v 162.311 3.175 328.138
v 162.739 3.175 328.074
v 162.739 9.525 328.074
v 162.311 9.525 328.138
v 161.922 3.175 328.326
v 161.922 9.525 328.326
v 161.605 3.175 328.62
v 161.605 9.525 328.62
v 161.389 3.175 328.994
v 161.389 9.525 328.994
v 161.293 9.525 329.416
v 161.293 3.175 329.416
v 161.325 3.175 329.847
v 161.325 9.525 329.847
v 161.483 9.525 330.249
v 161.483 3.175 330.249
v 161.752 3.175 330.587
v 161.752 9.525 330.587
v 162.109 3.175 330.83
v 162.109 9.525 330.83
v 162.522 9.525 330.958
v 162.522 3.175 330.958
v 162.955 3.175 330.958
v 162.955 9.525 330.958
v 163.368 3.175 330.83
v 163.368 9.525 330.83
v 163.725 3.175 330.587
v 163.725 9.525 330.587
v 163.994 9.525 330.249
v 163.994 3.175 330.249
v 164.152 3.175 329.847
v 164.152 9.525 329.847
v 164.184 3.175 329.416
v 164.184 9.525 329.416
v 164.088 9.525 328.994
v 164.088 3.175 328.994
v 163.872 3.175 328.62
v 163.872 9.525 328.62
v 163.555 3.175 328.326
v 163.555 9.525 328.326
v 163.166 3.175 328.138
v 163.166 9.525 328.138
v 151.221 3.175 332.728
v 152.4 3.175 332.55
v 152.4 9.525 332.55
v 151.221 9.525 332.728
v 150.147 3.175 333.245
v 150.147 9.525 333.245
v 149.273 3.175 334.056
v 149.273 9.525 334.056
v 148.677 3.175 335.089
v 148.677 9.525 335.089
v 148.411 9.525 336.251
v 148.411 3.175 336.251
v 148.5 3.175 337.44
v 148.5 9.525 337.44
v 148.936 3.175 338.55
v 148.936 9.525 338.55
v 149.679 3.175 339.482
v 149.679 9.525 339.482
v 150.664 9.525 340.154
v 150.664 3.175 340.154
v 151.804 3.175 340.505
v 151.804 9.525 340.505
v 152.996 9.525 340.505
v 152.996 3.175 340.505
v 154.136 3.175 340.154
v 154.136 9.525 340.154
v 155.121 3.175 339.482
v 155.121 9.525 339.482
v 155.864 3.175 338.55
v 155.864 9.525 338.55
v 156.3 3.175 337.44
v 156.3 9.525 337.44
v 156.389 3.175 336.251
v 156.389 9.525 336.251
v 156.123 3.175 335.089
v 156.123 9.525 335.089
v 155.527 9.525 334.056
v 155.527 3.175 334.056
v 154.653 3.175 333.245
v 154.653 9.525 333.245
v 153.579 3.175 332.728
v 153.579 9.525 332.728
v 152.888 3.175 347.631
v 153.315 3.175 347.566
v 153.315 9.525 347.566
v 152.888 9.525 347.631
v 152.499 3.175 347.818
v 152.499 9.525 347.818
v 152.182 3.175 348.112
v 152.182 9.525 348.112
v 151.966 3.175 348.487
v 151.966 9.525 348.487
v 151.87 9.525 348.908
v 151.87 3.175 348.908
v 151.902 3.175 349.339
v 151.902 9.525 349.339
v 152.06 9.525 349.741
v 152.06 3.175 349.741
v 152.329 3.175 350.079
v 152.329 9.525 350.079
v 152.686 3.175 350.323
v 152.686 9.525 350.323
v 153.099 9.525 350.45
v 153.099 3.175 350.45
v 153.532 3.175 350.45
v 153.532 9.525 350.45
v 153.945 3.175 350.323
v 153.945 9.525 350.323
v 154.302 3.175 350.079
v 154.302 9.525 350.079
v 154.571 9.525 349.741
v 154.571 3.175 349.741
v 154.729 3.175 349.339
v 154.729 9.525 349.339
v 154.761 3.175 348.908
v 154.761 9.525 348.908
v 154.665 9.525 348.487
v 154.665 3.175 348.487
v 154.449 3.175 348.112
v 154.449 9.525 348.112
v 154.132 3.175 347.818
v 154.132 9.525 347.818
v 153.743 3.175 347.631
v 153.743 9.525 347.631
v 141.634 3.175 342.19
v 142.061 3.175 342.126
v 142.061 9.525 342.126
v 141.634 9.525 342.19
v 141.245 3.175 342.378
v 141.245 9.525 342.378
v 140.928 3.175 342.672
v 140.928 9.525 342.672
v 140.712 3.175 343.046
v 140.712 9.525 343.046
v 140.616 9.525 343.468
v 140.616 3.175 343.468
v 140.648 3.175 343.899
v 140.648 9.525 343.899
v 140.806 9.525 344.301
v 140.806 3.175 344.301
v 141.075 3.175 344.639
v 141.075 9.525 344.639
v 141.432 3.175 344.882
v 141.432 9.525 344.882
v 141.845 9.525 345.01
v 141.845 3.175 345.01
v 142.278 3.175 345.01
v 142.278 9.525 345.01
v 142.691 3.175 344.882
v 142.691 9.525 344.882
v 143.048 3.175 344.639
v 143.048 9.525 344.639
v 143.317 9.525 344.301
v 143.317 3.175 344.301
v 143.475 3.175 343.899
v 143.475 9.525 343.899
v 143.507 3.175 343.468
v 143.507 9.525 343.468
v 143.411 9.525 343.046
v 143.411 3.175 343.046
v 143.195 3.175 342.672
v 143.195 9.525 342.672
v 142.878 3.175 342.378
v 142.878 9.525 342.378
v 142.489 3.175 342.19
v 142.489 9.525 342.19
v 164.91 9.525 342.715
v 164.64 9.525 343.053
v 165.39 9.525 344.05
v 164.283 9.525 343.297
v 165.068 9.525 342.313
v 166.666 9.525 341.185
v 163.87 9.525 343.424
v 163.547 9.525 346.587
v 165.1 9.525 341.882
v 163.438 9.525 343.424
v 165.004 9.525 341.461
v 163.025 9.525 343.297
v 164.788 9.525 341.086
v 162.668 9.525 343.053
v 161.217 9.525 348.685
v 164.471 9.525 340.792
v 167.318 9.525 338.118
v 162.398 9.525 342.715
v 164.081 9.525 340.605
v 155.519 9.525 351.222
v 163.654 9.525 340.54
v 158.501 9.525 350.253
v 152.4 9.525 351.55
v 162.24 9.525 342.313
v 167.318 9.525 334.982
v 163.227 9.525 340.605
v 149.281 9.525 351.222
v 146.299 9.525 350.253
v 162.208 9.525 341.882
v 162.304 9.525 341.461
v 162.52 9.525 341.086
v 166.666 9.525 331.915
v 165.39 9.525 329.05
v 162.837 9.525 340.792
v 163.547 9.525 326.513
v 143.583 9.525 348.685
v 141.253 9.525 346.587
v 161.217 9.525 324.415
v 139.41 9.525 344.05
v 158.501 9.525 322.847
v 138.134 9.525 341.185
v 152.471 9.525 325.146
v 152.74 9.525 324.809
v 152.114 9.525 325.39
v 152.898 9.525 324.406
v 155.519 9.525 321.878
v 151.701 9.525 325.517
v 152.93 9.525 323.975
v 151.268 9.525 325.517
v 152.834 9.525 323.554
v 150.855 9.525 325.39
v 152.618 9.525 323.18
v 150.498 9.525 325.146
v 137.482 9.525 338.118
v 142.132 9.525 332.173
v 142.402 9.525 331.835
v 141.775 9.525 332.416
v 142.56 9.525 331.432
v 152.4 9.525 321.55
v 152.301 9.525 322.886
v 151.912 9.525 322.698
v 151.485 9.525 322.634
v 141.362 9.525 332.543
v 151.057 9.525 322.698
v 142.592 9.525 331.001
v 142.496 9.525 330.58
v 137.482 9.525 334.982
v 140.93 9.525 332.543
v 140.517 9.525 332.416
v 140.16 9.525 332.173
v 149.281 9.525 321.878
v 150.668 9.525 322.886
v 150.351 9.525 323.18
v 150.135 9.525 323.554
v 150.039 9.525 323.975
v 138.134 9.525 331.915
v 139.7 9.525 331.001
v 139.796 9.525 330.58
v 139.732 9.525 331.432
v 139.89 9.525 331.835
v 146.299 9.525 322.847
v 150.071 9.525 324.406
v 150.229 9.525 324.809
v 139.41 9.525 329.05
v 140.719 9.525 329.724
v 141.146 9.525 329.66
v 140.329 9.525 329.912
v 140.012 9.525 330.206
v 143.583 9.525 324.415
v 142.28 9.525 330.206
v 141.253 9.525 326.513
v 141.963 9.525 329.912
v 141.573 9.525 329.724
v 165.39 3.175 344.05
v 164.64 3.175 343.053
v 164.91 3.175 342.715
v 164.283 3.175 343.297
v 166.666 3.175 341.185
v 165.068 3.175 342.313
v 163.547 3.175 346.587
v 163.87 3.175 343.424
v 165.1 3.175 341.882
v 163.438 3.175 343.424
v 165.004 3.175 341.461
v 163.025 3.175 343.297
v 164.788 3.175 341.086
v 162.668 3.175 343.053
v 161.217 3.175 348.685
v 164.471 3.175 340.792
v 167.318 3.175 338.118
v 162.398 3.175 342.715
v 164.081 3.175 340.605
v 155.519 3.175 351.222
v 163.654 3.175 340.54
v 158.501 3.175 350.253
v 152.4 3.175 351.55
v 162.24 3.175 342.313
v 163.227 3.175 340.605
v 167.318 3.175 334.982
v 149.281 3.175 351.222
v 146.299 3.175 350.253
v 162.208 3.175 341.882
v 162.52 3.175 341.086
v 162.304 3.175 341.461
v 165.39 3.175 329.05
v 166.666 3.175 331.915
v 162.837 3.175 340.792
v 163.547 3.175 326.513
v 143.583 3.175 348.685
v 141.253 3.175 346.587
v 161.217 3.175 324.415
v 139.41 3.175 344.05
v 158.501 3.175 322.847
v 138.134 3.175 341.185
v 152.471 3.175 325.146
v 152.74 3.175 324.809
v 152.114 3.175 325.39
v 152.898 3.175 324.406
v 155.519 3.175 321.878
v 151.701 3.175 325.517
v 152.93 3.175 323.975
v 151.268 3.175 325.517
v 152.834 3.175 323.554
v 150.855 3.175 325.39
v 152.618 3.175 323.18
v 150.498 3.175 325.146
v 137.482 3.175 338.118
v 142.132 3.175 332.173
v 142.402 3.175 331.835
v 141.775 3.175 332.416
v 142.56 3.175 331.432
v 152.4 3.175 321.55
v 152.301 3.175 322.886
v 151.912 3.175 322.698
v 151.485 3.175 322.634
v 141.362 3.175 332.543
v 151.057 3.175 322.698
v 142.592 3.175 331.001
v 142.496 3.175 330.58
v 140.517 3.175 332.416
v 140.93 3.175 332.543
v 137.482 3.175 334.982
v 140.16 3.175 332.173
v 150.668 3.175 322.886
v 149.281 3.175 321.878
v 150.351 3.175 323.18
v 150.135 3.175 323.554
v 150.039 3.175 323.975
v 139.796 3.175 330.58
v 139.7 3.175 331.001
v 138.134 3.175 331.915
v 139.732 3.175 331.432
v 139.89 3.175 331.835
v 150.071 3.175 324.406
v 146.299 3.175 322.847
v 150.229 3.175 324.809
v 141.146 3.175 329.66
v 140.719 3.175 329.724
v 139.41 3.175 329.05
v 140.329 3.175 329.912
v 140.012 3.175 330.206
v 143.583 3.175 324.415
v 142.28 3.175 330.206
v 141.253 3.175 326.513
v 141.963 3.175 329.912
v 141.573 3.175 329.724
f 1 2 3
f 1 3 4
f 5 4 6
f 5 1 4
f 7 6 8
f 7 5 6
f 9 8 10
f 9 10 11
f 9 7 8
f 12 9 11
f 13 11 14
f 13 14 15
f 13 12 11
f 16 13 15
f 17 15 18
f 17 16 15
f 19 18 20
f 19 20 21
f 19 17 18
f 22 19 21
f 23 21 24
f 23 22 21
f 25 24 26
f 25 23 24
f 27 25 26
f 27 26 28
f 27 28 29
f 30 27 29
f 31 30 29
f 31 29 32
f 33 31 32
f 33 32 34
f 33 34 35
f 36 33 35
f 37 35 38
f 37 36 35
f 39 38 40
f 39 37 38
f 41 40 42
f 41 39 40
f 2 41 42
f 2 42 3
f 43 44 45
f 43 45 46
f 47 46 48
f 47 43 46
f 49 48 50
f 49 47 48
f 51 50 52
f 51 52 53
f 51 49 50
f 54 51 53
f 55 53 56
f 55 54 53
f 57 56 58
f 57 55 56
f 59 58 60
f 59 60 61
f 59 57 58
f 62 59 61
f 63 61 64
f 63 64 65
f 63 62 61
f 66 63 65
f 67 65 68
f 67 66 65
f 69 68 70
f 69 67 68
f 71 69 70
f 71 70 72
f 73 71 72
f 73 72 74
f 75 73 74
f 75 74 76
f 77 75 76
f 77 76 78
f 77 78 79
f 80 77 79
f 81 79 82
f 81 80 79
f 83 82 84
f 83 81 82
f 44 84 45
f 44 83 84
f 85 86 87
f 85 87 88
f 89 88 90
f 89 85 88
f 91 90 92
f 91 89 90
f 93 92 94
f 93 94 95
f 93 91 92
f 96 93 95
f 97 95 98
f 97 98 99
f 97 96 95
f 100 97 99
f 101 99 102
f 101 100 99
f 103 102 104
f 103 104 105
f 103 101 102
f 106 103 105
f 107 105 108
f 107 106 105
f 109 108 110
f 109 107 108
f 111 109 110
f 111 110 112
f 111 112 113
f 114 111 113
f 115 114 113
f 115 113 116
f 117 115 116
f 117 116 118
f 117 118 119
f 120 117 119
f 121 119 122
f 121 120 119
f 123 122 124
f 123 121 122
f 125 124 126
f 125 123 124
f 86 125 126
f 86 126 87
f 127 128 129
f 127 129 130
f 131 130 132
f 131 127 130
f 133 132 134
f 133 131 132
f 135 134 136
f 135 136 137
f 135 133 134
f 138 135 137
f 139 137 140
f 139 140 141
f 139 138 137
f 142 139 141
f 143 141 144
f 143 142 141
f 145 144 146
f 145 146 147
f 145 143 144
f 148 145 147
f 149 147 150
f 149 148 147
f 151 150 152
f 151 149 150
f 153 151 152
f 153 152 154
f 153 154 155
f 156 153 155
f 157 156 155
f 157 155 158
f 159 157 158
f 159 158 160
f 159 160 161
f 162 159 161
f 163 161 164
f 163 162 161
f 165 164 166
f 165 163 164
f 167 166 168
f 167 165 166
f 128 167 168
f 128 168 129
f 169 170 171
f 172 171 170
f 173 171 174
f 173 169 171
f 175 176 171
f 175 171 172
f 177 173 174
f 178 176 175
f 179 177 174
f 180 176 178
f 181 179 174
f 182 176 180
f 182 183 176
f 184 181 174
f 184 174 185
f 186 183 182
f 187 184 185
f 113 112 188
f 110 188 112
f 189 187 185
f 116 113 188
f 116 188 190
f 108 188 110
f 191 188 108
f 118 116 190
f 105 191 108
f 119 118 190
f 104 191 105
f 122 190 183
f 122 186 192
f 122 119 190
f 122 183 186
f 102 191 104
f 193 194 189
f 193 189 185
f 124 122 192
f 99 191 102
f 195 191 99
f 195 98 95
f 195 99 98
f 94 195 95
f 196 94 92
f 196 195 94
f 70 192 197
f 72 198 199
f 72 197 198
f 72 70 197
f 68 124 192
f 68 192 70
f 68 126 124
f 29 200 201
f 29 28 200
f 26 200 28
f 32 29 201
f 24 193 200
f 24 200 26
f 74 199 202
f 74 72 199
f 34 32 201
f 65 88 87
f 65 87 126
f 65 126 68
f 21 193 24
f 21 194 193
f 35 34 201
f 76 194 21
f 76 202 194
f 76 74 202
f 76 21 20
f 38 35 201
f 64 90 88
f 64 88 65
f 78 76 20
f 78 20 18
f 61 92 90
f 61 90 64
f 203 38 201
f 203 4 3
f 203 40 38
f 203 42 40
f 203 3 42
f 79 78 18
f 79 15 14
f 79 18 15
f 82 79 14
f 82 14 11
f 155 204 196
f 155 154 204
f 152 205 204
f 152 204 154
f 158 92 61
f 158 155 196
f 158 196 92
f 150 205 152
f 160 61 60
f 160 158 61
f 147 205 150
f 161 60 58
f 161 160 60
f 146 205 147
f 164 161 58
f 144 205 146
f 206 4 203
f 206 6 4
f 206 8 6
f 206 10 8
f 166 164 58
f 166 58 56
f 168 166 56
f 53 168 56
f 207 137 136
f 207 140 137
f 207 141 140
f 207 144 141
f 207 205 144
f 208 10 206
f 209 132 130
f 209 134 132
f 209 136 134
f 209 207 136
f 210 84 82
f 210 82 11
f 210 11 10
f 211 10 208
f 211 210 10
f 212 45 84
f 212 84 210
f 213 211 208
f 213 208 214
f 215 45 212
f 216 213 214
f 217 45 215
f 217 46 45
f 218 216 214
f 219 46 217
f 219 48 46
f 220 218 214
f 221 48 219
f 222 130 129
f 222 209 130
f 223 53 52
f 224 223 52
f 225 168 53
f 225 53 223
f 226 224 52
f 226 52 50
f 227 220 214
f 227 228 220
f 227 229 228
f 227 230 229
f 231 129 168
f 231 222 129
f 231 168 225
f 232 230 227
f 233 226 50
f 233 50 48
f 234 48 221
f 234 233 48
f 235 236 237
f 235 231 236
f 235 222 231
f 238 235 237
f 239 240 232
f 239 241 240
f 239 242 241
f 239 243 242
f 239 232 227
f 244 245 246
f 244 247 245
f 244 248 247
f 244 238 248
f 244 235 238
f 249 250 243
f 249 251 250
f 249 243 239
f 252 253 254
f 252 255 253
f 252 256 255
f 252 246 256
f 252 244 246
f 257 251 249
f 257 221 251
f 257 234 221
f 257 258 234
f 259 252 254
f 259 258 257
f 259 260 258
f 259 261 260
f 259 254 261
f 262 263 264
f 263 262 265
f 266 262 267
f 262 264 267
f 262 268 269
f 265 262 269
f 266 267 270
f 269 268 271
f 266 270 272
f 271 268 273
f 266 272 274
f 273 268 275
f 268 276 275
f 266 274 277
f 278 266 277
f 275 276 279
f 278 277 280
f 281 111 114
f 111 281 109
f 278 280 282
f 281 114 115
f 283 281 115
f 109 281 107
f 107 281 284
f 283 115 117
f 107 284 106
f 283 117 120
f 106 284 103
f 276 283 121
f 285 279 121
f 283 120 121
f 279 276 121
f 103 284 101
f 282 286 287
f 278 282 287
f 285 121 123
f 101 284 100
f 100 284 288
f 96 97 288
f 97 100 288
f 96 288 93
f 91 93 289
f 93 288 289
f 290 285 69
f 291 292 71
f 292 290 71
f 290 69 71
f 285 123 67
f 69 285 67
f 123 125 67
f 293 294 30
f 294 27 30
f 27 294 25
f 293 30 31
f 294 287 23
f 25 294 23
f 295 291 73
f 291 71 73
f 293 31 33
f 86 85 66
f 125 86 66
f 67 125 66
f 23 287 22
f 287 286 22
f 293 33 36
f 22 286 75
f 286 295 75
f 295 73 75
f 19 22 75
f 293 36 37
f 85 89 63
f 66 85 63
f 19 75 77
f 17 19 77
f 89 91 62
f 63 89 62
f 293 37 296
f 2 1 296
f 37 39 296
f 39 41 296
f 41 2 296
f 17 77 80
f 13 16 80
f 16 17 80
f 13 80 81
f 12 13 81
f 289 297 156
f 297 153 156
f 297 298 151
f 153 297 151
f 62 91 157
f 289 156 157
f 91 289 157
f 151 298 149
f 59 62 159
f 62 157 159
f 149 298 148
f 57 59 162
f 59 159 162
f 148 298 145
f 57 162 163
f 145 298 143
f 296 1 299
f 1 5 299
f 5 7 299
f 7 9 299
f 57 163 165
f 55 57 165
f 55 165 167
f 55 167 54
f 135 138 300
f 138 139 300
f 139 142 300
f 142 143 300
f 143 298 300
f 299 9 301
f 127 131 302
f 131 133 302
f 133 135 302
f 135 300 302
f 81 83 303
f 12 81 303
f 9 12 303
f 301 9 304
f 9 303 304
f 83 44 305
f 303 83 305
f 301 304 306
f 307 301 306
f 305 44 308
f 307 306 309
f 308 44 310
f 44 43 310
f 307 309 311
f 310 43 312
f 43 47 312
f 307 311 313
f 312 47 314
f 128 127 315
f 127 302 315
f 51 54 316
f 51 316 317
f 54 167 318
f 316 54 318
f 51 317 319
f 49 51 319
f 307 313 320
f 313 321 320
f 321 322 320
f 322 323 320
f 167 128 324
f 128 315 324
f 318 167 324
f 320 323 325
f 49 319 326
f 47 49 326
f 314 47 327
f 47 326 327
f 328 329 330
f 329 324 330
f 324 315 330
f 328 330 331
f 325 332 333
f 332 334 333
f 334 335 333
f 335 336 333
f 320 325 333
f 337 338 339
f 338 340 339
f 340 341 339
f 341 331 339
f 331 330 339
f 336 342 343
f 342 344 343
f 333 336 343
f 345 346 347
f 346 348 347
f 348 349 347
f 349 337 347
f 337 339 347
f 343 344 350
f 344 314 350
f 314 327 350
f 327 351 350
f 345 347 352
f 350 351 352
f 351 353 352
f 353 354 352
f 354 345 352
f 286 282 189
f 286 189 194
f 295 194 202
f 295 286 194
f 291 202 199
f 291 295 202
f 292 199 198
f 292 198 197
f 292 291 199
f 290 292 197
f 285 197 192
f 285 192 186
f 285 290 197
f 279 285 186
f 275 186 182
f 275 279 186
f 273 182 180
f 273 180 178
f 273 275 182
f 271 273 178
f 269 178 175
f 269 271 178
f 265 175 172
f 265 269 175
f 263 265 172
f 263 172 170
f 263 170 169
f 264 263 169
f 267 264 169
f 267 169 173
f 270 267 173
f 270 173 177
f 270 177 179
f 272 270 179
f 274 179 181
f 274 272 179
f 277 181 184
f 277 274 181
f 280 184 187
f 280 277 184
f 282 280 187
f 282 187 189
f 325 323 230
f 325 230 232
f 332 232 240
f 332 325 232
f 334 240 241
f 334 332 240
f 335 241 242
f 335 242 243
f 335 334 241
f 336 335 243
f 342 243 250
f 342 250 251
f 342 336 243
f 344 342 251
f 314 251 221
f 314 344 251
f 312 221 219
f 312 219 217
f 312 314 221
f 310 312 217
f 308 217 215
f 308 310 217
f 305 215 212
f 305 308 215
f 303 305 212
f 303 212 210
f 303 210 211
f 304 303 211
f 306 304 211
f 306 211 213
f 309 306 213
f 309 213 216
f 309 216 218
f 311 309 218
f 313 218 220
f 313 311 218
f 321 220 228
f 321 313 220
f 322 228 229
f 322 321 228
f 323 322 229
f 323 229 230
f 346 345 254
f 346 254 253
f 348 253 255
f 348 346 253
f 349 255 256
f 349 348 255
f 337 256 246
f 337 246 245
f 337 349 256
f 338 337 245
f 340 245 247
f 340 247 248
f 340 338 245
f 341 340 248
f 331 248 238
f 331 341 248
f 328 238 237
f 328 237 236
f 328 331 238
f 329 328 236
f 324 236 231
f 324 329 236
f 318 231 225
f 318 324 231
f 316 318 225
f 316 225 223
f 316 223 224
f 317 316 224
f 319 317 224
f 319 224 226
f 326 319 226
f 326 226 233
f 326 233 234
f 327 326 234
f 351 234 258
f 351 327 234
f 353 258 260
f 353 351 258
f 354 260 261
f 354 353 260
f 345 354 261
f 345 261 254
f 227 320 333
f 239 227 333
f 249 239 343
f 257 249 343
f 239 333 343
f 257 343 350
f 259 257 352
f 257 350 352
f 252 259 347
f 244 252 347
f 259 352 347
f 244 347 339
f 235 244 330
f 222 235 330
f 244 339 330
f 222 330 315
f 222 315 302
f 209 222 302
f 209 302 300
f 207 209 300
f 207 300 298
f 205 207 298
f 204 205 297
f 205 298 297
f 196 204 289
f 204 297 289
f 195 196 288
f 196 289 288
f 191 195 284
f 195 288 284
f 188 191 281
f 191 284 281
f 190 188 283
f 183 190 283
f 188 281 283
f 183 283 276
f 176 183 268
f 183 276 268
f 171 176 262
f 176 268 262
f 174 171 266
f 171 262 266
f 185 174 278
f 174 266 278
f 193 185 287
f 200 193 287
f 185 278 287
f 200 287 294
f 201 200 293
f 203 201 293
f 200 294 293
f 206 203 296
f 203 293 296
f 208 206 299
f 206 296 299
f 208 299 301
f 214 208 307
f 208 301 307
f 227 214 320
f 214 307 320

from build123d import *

# Parameters (mm, degrees)
DISCO_START    = 3.175
CROQUIS1_R     = 15
DISCO_DEPTH    = 6.35
BARRENOS_START = 3.175
CROQUIS2_R     = 1.45
CROQUIS2_R_2   = 4
BARRENOS_DEPTH = 6.35


with BuildPart() as part:
    # Croquis1 → Disco (new body)
    with BuildSketch(Plane(origin=(0, 0, 0), x_dir=(1, 0, 0), z_dir=(0, 1, 0)).offset(DISCO_START)):
        with Locations(Location((152.4, -336.55, 0), (0, 0, 90))):
            Circle(CROQUIS1_R)
    extrude(amount=DISCO_DEPTH)

    # Croquis2 → Barrenos (cut)
    with BuildSketch(Plane(origin=(0, 0, 0), x_dir=(1, 0, 0), z_dir=(0, 1, 0)).offset(BARRENOS_START)):
        with Locations(Location((163.653984643, -341.990388742, 0), (0, 0, 90))):
            Circle(CROQUIS2_R)
        with Locations(Location((153.315477464, -349.016430965, 0), (0, 0, 90))):
            Circle(CROQUIS2_R)
        with Locations(Location((142.061492822, -343.576042223, 0), (0, 0, 90))):
            Circle(CROQUIS2_R)
        with Locations(Location((141.146015357, -331.109611258, 0), (0, 0, 90))):
            Circle(CROQUIS2_R)
        with Locations(Location((151.484522536, -324.083569035, 0), (0, 0, 90))):
            Circle(CROQUIS2_R)
        with Locations(Location((162.738507178, -329.523957777, 0), (0, 0, 90))):
            Circle(CROQUIS2_R)
        with Locations(Location((152.4, -336.55, 0), (0, 0, 90))):
            Circle(CROQUIS2_R_2)
    extrude(amount=BARRENOS_DEPTH, mode=Mode.SUBTRACT)


solid = part.part
